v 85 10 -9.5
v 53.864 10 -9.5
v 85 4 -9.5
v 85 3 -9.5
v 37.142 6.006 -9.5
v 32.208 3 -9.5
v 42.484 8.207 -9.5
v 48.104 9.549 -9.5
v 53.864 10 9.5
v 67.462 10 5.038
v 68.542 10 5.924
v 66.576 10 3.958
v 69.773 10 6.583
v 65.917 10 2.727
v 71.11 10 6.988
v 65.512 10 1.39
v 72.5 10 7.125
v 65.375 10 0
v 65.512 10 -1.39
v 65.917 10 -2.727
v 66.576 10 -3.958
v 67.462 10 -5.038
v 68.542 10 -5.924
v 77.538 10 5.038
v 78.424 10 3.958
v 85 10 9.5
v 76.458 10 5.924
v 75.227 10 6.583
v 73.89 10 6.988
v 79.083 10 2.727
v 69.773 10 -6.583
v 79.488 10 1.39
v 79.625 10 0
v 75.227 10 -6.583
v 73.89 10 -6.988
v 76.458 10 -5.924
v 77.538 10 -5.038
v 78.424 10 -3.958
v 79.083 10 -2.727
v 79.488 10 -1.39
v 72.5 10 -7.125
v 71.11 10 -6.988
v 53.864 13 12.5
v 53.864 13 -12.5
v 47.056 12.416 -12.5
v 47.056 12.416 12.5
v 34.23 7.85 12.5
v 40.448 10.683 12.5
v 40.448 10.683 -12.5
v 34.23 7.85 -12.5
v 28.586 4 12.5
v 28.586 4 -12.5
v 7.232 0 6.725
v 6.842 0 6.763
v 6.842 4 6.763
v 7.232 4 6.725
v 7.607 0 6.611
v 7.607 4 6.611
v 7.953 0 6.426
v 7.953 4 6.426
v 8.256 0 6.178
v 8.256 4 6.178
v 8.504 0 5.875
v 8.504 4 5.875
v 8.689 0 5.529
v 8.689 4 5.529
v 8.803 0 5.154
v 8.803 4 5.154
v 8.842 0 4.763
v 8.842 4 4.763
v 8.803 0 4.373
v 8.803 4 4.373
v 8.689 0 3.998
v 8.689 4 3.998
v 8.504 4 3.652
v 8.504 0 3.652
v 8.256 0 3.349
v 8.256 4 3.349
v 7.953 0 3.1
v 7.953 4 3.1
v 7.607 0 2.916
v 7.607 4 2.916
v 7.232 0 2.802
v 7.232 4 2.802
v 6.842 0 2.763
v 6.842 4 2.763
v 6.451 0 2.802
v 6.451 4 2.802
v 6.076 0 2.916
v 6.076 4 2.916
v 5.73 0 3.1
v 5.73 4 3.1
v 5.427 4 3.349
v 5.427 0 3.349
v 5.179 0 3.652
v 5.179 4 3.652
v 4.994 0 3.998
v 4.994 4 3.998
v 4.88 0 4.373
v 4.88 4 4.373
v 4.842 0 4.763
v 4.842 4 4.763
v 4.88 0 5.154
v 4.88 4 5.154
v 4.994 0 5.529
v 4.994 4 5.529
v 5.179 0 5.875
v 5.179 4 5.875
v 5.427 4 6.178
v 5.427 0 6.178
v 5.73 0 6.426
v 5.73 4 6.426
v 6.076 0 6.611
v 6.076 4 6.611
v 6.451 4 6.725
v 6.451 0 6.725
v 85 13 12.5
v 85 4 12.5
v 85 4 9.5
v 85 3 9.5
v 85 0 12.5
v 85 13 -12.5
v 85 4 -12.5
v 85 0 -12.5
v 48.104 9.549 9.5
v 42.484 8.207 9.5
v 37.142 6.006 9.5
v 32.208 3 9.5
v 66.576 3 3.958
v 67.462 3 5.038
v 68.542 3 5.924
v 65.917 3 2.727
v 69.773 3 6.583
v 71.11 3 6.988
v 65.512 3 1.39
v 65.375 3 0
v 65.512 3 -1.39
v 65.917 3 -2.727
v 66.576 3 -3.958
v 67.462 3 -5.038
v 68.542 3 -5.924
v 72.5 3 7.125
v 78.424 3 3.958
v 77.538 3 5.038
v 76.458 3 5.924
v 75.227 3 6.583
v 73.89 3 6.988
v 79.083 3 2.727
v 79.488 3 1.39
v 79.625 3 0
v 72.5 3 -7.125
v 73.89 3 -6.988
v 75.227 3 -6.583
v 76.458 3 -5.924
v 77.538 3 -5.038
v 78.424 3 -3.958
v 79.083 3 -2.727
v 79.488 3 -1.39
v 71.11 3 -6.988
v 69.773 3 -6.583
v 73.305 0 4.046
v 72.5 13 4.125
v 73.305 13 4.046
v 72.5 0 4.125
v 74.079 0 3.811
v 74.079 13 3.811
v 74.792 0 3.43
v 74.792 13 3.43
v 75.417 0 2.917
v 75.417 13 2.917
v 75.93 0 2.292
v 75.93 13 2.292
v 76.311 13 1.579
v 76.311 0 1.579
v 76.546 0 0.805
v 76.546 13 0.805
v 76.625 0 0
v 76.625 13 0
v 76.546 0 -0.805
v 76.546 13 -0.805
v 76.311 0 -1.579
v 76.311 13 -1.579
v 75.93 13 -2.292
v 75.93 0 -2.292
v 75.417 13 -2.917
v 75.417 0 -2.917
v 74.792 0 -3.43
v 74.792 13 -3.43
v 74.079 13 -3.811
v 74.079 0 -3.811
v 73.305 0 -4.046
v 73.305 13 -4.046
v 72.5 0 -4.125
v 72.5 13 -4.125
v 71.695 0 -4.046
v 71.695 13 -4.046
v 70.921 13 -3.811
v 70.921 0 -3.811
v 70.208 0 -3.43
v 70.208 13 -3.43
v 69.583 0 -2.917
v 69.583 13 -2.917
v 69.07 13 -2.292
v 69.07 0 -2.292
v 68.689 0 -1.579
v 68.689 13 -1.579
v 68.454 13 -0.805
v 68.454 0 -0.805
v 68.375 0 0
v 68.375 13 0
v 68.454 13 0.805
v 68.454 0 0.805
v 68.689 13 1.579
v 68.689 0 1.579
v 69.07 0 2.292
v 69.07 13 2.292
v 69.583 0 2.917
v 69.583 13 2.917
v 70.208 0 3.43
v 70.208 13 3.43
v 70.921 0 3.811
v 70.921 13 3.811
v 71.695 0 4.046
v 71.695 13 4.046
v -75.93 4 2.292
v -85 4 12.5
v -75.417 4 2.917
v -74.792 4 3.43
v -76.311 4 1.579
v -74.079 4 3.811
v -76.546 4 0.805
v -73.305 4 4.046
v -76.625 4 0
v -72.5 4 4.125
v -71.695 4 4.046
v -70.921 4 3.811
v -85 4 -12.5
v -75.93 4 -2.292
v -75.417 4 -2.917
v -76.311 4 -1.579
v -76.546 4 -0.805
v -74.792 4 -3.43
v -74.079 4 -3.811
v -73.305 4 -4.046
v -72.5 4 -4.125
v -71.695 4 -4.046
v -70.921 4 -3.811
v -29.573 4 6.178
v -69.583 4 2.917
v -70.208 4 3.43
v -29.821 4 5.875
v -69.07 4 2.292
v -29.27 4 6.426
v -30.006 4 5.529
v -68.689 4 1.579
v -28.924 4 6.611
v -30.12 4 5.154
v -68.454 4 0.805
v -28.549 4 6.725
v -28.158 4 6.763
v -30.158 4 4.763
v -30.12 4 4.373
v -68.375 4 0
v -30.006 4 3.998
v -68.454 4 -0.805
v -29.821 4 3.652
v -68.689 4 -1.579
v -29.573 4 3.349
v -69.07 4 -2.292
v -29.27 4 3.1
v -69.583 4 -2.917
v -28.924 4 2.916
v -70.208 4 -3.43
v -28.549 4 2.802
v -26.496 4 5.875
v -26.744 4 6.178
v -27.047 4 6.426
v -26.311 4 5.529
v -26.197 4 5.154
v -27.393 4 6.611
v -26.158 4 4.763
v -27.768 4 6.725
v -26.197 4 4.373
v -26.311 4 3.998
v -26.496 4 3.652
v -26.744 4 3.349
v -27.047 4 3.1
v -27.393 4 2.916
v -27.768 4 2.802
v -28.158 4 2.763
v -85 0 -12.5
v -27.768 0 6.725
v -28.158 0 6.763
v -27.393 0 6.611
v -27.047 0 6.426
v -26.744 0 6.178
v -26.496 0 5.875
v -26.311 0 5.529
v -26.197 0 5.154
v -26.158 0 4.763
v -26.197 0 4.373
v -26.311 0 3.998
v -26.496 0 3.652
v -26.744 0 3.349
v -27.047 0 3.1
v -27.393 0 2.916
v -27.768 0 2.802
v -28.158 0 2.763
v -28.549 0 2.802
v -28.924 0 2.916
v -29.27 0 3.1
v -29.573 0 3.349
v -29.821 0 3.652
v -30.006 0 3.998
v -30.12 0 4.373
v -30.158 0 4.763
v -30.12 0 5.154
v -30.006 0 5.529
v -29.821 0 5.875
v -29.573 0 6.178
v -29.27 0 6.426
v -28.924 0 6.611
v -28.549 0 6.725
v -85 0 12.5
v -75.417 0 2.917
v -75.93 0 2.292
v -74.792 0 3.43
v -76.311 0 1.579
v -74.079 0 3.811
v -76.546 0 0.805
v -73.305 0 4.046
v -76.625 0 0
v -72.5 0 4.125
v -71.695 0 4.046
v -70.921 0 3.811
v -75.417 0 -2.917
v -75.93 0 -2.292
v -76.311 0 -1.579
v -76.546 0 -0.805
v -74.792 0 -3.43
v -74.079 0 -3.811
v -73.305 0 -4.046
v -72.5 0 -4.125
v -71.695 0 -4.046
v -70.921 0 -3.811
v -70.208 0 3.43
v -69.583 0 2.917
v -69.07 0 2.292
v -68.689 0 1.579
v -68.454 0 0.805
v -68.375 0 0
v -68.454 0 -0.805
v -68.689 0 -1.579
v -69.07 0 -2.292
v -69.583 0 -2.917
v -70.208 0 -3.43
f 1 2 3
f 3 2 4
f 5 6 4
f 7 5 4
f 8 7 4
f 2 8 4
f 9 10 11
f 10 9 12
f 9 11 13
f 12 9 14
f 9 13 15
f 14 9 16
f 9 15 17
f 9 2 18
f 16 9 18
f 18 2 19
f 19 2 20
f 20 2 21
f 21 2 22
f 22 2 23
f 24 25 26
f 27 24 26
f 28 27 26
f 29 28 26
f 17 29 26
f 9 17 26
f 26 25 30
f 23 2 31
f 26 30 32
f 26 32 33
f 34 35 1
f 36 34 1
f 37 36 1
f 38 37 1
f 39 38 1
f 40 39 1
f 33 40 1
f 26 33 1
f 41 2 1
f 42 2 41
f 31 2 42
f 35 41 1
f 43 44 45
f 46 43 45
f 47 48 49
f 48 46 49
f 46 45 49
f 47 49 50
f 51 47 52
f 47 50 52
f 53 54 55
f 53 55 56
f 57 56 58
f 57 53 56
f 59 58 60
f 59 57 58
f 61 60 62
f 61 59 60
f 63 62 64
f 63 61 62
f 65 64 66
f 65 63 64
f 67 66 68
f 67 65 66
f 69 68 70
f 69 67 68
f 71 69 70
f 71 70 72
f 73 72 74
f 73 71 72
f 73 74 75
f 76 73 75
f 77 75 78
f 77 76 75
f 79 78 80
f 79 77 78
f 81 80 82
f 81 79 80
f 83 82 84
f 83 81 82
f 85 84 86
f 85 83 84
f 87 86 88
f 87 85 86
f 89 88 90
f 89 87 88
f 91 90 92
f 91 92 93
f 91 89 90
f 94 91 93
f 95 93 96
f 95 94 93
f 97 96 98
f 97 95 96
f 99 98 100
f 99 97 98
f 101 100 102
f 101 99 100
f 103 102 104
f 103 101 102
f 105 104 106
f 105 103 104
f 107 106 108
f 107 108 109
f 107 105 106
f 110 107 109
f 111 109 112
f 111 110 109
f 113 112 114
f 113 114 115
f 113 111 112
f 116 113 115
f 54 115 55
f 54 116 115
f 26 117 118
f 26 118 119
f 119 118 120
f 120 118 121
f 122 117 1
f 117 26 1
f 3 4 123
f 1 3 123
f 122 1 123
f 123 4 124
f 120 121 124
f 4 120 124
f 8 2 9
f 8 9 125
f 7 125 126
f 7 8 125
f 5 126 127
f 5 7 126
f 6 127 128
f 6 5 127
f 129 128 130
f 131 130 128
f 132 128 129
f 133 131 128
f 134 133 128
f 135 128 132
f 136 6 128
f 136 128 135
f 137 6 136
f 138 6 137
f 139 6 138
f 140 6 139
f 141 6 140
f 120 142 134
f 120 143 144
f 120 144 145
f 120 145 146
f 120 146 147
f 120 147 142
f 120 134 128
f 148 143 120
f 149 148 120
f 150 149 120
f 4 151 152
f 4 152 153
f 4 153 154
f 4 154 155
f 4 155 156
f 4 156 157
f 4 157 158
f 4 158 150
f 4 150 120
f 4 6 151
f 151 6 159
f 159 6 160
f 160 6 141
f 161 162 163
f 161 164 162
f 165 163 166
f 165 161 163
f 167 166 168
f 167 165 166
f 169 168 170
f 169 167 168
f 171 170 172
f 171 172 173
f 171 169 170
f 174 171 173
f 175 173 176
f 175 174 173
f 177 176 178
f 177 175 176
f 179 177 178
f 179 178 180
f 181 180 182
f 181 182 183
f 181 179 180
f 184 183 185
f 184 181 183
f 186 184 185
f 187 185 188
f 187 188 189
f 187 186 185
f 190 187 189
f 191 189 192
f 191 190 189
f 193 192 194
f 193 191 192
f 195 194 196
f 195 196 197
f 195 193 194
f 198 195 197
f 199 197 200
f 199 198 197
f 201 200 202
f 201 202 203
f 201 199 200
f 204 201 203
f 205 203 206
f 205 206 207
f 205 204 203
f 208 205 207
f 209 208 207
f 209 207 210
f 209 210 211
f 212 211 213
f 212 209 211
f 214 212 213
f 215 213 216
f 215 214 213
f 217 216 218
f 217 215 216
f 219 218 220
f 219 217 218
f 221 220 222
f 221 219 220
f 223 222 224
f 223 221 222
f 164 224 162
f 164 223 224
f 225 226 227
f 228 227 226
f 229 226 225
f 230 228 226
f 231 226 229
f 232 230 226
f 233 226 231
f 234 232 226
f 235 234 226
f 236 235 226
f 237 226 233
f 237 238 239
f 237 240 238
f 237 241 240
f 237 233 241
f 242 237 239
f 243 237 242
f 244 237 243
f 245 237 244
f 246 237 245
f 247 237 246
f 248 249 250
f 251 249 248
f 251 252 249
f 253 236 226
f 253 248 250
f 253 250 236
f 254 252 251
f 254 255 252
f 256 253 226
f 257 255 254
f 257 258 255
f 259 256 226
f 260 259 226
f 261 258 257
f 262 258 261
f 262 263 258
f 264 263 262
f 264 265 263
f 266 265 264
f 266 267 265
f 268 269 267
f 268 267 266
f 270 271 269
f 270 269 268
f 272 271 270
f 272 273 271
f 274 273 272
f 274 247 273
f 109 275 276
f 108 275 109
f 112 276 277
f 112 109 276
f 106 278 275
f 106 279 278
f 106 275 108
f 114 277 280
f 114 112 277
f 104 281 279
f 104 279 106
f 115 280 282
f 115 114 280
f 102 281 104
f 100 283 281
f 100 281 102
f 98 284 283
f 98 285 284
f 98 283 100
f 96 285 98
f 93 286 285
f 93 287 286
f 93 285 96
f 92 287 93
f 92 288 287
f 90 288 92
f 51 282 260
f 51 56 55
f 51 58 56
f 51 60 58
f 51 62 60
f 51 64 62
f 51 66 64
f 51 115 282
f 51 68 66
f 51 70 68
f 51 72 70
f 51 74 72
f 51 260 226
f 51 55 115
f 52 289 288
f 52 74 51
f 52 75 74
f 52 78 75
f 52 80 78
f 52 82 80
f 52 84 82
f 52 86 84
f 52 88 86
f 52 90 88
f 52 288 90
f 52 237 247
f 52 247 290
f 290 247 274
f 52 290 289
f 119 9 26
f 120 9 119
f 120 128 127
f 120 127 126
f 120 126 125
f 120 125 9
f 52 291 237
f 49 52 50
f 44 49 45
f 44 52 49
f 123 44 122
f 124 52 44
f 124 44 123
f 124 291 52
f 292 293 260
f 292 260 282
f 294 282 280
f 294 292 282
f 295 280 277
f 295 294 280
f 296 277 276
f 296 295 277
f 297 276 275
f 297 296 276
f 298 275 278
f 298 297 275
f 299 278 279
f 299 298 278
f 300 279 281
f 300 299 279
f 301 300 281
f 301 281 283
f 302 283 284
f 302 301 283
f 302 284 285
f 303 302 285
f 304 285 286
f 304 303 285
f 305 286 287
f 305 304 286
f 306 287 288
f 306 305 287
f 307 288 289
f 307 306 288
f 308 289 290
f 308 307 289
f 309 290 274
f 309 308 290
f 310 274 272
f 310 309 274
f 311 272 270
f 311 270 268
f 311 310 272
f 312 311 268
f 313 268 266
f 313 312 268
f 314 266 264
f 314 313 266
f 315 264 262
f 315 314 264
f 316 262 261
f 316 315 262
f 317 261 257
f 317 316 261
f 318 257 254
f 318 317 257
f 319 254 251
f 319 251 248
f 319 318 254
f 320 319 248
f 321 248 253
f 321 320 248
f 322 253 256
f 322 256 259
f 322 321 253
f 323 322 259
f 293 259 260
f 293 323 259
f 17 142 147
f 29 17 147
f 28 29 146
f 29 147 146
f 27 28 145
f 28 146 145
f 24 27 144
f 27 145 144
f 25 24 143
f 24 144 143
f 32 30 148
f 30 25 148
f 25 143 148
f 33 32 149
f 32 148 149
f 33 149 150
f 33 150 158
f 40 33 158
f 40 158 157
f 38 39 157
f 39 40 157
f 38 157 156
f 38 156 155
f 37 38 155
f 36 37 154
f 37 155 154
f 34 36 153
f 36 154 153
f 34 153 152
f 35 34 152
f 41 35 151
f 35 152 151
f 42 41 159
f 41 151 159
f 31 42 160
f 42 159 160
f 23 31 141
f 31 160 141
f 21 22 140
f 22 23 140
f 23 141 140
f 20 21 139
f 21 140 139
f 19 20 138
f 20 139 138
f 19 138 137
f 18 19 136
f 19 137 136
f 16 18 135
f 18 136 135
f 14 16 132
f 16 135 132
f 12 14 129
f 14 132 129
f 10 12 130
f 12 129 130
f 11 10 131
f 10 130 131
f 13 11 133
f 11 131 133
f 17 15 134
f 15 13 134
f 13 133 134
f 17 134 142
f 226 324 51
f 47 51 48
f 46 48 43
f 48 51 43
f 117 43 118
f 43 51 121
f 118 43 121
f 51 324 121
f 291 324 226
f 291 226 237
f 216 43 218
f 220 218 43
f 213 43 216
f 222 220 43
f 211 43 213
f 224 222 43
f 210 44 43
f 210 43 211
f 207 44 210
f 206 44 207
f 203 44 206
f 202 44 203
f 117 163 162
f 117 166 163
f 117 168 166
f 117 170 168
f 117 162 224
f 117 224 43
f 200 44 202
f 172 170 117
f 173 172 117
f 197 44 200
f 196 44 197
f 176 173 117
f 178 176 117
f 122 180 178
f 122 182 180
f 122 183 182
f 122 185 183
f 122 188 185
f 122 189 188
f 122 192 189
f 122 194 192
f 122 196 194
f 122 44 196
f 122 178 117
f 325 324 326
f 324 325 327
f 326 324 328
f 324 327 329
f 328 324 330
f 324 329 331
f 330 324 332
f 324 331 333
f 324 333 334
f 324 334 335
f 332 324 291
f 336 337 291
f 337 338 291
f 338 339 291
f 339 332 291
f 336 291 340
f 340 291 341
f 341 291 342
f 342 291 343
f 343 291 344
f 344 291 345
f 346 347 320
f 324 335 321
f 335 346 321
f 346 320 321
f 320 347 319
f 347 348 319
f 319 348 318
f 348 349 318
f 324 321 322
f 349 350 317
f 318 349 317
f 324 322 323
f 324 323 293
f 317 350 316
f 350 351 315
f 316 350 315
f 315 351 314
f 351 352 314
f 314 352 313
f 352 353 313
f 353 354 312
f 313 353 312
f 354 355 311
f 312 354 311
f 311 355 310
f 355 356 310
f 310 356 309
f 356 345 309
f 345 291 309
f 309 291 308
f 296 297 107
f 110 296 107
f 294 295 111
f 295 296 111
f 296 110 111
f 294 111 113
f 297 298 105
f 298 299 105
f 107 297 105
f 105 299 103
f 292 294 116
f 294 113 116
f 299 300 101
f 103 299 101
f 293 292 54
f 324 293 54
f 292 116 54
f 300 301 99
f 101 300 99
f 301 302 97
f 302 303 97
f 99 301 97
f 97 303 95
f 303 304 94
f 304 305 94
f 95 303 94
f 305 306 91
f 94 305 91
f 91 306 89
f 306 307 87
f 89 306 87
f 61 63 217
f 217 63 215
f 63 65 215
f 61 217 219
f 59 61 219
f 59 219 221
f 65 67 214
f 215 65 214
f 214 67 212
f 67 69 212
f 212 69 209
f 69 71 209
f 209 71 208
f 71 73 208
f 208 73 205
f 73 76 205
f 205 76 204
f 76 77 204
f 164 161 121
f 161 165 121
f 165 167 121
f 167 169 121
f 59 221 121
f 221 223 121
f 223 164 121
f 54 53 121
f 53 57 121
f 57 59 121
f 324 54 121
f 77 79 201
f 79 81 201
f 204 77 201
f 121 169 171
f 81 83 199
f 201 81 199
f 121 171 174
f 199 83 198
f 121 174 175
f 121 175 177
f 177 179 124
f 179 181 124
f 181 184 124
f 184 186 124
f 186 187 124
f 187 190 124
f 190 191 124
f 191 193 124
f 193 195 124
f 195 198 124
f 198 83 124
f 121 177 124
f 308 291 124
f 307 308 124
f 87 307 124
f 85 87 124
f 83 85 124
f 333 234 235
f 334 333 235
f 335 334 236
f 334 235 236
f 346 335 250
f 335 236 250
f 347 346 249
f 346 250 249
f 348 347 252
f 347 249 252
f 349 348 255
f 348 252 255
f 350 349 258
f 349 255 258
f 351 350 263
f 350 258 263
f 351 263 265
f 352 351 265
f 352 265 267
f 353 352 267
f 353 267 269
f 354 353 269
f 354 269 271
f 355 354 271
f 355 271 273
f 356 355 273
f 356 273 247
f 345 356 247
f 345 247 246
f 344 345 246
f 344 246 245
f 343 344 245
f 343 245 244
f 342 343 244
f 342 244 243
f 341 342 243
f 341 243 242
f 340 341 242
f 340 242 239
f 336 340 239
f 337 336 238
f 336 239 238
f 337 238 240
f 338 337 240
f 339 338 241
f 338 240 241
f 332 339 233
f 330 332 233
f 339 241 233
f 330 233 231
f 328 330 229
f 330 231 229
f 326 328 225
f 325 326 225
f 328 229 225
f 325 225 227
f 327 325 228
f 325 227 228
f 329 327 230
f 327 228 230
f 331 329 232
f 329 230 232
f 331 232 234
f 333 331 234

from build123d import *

# Parameters (mm, degrees)
SKETCH1_W           = 170
SKETCH1_H           = 25
SKETCH1_R           = 2
SKETCH1_R_2         = 4.125
BOSS_EXTRUDE1_DEPTH = 4
SKETCH2_R           = 4.125
CUT_EXTRUDE1_DEPTH  = 87.007267135
SKETCH3_W           = 56.414472257
SKETCH3_H           = 25
SKETCH3_R           = 4.125
BOSS_EXTRUDE2_DEPTH = 9
FILLET1_R           = 40
SHELL2_T            = -3


with BuildPart() as part:
    # Sketch1 → Boss-Extrude1 (new body)
    with BuildSketch(Plane(origin=(0, 0, 0), x_dir=(1, 0, 0), z_dir=(0, 1, 0))):
        Rectangle(SKETCH1_W, SKETCH1_H)
        with Locations(Location((-28.158485727, -4.763382536, 0), (0, 0, 270))):
            Circle(SKETCH1_R, mode=Mode.SUBTRACT)
        with Locations(Location((6.841514273, -4.763382536, 0), (0, 0, 270))):
            Circle(SKETCH1_R, mode=Mode.SUBTRACT)
        with Locations(Location((72.5, 0, 0), (0, 0, 270))):
            Circle(SKETCH1_R_2, mode=Mode.SUBTRACT)
    extrude(amount=BOSS_EXTRUDE1_DEPTH)

    # Sketch2 → Cut-Extrude1 (cut, through all)
    with BuildSketch(Plane(origin=(0, 4, 0), x_dir=(1, 0, 0), z_dir=(0, 1, 0))):
        with Locations(Location((-72.5, 0, 0), (0, 0, 270))):
            Circle(SKETCH2_R)
    extrude(amount=-CUT_EXTRUDE1_DEPTH, mode=Mode.SUBTRACT)

    # Sketch3 → Boss-Extrude2 (add)
    with BuildSketch(Plane(origin=(0, 4, 0), x_dir=(1, 0, 0), z_dir=(0, 1, 0))):
        with Locations((56.792763872, 0)):
            Rectangle(SKETCH3_W, SKETCH3_H)
        with Locations(Location((72.5, 0, 0), (0, 0, 270))):
            Circle(SKETCH3_R, mode=Mode.SUBTRACT)
    extrude(amount=BOSS_EXTRUDE2_DEPTH)

    # Fillet1
    # the kernel refuses this fillet: 40 mm, written as the material it takes off along each edge
    with BuildSketch(Plane(origin=(28.585527743, 13, -75.696123299), x_dir=(1, 0, 0), z_dir=(0, 0, 1))) as fillet1_piece_1:
        with BuildLine():
            CenterArc((25.27844932, -40), FILLET1_R, 90, 39.194967426)
            Line((0, -9), (0, 0))
            Line((0, 0), (25.27844932, 0))
        make_face()
    extrude(amount=151.392246598, mode=Mode.SUBTRACT)

    # Shell2
    shell2_openings = [part.faces().sort_by_distance(p)[0] for p in [
        (85, 6.5, 0),
    ]]
    offset(amount=SHELL2_T, openings=shell2_openings)


solid = part.part
